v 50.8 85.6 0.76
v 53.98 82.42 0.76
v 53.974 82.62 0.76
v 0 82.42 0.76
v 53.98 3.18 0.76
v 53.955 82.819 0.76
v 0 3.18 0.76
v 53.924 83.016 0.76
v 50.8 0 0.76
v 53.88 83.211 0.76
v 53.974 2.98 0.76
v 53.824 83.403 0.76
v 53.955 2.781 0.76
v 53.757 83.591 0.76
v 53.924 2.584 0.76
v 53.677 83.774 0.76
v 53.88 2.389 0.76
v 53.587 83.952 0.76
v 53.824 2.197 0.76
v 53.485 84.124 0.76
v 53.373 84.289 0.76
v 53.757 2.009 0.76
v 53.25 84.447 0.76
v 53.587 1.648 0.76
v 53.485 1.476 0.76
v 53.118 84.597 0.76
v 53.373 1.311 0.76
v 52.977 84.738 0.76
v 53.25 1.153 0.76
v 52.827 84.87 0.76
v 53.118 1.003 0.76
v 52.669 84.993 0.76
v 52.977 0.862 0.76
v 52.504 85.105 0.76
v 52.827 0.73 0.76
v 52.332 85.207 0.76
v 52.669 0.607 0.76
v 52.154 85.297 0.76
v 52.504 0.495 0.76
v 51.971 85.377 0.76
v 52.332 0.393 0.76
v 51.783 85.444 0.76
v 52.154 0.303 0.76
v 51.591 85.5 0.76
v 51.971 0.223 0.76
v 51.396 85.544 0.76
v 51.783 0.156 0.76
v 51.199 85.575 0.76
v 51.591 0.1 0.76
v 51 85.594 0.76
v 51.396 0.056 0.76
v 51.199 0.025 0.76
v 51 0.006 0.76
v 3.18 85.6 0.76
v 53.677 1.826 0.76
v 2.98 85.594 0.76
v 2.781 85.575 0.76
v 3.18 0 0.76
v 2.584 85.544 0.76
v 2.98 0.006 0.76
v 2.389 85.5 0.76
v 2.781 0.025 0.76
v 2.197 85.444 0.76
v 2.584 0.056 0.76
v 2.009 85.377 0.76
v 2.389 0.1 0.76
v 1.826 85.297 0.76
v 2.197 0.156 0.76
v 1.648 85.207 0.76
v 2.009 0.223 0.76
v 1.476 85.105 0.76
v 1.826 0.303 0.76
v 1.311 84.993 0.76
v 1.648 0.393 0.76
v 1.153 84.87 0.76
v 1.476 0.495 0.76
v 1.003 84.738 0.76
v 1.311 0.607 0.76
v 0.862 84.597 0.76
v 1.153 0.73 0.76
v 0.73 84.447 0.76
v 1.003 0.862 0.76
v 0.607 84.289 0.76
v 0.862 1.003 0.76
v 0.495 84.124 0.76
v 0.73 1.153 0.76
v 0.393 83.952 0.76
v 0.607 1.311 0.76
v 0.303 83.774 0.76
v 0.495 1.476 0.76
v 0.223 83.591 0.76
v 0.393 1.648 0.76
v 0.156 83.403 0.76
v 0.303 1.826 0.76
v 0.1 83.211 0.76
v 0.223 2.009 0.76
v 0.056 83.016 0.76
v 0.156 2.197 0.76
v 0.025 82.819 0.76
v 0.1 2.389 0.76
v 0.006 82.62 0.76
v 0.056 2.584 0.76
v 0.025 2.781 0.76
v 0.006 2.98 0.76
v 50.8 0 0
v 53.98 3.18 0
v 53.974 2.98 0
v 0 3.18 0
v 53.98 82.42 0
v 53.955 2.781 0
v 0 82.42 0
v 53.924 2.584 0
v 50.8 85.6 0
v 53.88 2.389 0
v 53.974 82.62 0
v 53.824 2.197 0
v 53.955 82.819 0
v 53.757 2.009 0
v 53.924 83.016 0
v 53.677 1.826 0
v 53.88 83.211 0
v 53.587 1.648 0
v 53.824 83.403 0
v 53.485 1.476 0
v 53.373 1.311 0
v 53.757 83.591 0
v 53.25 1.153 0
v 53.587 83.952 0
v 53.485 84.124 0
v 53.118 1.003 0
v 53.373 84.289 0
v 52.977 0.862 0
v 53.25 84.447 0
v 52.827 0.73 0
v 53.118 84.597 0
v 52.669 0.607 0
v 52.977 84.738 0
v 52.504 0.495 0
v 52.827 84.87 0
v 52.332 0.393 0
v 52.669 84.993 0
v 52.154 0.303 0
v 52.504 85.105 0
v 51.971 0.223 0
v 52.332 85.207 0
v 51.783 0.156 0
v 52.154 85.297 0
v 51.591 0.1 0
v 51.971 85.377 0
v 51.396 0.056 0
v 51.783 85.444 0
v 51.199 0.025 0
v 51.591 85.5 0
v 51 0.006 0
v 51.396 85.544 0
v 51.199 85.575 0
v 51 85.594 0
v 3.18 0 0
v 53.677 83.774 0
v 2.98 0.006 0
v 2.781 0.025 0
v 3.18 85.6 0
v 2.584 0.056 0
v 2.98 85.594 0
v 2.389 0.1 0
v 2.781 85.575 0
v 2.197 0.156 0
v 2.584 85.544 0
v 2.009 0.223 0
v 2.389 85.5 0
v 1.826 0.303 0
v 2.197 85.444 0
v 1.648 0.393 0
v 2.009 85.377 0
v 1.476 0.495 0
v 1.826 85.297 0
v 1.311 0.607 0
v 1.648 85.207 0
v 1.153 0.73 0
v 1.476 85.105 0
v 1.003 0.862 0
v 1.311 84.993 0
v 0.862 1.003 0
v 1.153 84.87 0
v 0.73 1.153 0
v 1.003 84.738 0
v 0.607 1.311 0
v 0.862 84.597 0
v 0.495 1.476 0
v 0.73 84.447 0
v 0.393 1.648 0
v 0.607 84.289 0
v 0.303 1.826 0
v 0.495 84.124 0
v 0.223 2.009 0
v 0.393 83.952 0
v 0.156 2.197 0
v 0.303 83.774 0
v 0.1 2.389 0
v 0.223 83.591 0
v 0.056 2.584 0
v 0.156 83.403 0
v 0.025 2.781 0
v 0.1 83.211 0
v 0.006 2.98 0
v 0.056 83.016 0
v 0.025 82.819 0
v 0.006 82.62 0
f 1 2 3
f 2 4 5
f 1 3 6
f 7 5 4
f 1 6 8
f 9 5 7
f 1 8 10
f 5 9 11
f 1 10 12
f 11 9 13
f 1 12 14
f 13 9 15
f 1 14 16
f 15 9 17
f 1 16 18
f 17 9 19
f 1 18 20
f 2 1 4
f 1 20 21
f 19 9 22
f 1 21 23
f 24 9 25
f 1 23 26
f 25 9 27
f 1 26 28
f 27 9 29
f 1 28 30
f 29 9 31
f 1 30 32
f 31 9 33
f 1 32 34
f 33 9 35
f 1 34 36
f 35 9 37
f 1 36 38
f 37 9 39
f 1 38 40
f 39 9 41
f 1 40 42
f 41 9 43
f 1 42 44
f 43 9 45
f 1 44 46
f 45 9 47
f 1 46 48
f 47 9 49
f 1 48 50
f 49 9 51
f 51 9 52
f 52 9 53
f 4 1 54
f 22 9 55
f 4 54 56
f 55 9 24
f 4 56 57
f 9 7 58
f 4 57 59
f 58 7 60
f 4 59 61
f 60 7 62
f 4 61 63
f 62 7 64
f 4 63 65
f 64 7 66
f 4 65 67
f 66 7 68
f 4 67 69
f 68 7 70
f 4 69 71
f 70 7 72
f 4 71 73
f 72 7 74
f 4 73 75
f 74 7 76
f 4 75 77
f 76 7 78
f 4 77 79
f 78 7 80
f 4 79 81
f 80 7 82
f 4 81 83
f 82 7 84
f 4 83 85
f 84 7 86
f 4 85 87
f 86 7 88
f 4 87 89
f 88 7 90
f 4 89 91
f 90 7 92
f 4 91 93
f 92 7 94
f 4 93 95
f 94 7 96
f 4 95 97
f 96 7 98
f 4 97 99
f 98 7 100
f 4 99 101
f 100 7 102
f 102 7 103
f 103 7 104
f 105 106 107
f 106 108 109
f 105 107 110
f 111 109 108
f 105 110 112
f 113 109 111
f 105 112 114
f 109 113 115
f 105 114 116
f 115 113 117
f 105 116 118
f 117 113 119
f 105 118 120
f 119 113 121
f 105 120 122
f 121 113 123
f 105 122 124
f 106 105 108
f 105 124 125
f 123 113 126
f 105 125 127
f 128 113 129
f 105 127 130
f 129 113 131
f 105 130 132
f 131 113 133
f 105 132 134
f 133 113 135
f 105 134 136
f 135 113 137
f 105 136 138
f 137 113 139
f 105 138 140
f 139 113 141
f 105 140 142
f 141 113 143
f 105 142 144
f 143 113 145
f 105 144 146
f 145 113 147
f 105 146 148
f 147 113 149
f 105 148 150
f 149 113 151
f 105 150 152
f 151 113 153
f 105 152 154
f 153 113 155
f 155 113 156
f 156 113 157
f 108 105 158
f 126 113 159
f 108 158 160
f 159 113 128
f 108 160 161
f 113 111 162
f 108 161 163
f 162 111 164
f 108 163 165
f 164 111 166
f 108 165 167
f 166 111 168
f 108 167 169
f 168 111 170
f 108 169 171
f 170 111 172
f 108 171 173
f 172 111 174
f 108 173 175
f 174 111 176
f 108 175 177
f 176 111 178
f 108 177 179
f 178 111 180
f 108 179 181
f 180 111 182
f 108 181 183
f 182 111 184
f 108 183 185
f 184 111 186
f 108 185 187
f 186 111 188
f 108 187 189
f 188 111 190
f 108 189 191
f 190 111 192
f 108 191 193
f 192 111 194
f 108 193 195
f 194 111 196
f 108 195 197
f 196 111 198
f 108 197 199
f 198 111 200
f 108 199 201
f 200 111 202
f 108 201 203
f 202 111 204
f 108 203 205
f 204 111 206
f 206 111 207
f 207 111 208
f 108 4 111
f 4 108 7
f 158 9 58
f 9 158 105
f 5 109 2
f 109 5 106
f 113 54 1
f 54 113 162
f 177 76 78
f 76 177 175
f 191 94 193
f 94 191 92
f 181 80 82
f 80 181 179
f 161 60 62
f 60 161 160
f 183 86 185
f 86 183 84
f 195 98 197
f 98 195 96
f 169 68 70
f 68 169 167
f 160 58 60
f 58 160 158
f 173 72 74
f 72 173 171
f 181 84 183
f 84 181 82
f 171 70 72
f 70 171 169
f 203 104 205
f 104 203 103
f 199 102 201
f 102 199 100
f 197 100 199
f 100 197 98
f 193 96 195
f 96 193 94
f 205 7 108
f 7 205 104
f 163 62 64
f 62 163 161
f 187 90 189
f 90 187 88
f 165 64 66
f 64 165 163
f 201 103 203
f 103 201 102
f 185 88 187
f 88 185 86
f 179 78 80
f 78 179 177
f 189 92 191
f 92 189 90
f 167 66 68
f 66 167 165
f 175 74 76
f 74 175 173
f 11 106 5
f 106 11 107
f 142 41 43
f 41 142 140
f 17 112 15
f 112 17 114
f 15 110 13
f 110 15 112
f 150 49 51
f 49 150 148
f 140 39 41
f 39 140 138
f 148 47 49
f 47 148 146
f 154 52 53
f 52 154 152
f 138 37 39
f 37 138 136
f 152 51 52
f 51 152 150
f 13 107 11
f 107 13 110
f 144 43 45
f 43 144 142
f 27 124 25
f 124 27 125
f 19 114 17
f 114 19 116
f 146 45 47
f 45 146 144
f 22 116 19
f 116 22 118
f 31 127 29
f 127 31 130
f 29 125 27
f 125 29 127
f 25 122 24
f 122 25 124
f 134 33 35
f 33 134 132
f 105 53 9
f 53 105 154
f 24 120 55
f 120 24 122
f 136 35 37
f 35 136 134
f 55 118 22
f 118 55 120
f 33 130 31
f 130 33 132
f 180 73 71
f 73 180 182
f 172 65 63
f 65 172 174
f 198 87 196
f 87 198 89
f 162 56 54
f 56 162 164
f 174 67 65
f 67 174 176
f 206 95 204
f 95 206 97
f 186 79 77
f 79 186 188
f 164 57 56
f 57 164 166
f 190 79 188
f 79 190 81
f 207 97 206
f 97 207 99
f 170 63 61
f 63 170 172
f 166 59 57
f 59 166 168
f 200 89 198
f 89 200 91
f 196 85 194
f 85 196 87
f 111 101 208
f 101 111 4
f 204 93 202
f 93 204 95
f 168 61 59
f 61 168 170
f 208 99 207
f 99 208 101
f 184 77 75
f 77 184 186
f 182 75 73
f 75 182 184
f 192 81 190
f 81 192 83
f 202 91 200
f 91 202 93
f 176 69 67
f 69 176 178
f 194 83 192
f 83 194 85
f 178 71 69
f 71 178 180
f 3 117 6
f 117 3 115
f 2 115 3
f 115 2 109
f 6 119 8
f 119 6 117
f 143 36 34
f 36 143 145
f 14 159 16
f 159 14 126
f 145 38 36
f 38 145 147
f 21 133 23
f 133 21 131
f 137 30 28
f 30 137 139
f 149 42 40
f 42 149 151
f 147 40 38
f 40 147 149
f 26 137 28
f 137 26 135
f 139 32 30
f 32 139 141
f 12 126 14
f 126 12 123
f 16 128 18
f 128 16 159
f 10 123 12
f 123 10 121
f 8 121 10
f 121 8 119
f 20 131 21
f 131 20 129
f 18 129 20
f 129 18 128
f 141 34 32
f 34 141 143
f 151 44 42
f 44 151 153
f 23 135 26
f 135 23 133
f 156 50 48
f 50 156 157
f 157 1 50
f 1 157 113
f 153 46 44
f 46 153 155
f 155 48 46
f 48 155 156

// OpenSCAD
module profile() {

polygon(points = [

[-3,-2.2], //part of total case width

[4,-2.2],[4,-0.2], //bottom lip

[0.4,-0.2],[0.4,1.45], //case bottom notch length

[-0.3,1.45],[-0.3,7.9], //notch depth

[0.4,7.9],[0.4,10.5], //case top notch length

[-0.3,10.5],[-0.3,12.2], //ID notch depth

[0.4,12.2],[0.4,14.4], //ID lip length

[-3,14.4] //other part of total case width

],
paths = [[0,1,2,3,4,5,6,7,8,9,10,11,12,13]]);

}

module card() {
	cube([53.98,85.60,0.76],center=false);
}

module cardCorn() {
	translate([3.18,3.18,0]) {
		cylinder(r=3.18,h=0.76, $fn = 100);
	}
	translate([53.98-3.18,3.18,0]) {
		cylinder(r=3.18,h=0.76, $fn = 100);
	}
	translate([3.18,85.60-3.18,0]) {
		cylinder(r=3.18,h=0.76, $fn = 100);
	}
	translate([53.98-3.18,85.60-3.18,0]) {
		cylinder(r=3.18,h=0.76, $fn = 100);
	}
}

module cardClip() {
	translate([0,0,0]) {
		cube([3.18,3.18,0.76]);
	}
	translate([53.98-3.18,0,0]) {
		cube([3.18,3.18,0.76]);
	}
	translate([0,85.60-3.18,0]) {
		cube([3.18,3.181,0.76]);
	}
	translate([53.98-3.18,85.60-3.18,0]) {
		cube([3.18,3.181,0.76]);
	}
}

// ~ ~ ~ ~ ~ ~ iPhone Constants ~ ~ ~ ~ ~  

antRaise = 0.60; //amount antenna raises from main body
antWidth = 1.59; //antenna width 
radii = 8.77; //corner radius for all four corners

// ~ ~ ~ ~ ~ ~ Case Variables ~ ~ ~ ~ ~  



// ~ ~ ~ ~ ~ ~ Case Tolerances ~ ~ ~ ~ 

widthTol = 0.5; //total slop for case width fitment

thickTol = 1; //total slop for case thickness fitment


// ~ ~ ~ ~ ~ ~ Make Case

//profile();

difference() {
card();
cardClip();
}
cardCorn();
